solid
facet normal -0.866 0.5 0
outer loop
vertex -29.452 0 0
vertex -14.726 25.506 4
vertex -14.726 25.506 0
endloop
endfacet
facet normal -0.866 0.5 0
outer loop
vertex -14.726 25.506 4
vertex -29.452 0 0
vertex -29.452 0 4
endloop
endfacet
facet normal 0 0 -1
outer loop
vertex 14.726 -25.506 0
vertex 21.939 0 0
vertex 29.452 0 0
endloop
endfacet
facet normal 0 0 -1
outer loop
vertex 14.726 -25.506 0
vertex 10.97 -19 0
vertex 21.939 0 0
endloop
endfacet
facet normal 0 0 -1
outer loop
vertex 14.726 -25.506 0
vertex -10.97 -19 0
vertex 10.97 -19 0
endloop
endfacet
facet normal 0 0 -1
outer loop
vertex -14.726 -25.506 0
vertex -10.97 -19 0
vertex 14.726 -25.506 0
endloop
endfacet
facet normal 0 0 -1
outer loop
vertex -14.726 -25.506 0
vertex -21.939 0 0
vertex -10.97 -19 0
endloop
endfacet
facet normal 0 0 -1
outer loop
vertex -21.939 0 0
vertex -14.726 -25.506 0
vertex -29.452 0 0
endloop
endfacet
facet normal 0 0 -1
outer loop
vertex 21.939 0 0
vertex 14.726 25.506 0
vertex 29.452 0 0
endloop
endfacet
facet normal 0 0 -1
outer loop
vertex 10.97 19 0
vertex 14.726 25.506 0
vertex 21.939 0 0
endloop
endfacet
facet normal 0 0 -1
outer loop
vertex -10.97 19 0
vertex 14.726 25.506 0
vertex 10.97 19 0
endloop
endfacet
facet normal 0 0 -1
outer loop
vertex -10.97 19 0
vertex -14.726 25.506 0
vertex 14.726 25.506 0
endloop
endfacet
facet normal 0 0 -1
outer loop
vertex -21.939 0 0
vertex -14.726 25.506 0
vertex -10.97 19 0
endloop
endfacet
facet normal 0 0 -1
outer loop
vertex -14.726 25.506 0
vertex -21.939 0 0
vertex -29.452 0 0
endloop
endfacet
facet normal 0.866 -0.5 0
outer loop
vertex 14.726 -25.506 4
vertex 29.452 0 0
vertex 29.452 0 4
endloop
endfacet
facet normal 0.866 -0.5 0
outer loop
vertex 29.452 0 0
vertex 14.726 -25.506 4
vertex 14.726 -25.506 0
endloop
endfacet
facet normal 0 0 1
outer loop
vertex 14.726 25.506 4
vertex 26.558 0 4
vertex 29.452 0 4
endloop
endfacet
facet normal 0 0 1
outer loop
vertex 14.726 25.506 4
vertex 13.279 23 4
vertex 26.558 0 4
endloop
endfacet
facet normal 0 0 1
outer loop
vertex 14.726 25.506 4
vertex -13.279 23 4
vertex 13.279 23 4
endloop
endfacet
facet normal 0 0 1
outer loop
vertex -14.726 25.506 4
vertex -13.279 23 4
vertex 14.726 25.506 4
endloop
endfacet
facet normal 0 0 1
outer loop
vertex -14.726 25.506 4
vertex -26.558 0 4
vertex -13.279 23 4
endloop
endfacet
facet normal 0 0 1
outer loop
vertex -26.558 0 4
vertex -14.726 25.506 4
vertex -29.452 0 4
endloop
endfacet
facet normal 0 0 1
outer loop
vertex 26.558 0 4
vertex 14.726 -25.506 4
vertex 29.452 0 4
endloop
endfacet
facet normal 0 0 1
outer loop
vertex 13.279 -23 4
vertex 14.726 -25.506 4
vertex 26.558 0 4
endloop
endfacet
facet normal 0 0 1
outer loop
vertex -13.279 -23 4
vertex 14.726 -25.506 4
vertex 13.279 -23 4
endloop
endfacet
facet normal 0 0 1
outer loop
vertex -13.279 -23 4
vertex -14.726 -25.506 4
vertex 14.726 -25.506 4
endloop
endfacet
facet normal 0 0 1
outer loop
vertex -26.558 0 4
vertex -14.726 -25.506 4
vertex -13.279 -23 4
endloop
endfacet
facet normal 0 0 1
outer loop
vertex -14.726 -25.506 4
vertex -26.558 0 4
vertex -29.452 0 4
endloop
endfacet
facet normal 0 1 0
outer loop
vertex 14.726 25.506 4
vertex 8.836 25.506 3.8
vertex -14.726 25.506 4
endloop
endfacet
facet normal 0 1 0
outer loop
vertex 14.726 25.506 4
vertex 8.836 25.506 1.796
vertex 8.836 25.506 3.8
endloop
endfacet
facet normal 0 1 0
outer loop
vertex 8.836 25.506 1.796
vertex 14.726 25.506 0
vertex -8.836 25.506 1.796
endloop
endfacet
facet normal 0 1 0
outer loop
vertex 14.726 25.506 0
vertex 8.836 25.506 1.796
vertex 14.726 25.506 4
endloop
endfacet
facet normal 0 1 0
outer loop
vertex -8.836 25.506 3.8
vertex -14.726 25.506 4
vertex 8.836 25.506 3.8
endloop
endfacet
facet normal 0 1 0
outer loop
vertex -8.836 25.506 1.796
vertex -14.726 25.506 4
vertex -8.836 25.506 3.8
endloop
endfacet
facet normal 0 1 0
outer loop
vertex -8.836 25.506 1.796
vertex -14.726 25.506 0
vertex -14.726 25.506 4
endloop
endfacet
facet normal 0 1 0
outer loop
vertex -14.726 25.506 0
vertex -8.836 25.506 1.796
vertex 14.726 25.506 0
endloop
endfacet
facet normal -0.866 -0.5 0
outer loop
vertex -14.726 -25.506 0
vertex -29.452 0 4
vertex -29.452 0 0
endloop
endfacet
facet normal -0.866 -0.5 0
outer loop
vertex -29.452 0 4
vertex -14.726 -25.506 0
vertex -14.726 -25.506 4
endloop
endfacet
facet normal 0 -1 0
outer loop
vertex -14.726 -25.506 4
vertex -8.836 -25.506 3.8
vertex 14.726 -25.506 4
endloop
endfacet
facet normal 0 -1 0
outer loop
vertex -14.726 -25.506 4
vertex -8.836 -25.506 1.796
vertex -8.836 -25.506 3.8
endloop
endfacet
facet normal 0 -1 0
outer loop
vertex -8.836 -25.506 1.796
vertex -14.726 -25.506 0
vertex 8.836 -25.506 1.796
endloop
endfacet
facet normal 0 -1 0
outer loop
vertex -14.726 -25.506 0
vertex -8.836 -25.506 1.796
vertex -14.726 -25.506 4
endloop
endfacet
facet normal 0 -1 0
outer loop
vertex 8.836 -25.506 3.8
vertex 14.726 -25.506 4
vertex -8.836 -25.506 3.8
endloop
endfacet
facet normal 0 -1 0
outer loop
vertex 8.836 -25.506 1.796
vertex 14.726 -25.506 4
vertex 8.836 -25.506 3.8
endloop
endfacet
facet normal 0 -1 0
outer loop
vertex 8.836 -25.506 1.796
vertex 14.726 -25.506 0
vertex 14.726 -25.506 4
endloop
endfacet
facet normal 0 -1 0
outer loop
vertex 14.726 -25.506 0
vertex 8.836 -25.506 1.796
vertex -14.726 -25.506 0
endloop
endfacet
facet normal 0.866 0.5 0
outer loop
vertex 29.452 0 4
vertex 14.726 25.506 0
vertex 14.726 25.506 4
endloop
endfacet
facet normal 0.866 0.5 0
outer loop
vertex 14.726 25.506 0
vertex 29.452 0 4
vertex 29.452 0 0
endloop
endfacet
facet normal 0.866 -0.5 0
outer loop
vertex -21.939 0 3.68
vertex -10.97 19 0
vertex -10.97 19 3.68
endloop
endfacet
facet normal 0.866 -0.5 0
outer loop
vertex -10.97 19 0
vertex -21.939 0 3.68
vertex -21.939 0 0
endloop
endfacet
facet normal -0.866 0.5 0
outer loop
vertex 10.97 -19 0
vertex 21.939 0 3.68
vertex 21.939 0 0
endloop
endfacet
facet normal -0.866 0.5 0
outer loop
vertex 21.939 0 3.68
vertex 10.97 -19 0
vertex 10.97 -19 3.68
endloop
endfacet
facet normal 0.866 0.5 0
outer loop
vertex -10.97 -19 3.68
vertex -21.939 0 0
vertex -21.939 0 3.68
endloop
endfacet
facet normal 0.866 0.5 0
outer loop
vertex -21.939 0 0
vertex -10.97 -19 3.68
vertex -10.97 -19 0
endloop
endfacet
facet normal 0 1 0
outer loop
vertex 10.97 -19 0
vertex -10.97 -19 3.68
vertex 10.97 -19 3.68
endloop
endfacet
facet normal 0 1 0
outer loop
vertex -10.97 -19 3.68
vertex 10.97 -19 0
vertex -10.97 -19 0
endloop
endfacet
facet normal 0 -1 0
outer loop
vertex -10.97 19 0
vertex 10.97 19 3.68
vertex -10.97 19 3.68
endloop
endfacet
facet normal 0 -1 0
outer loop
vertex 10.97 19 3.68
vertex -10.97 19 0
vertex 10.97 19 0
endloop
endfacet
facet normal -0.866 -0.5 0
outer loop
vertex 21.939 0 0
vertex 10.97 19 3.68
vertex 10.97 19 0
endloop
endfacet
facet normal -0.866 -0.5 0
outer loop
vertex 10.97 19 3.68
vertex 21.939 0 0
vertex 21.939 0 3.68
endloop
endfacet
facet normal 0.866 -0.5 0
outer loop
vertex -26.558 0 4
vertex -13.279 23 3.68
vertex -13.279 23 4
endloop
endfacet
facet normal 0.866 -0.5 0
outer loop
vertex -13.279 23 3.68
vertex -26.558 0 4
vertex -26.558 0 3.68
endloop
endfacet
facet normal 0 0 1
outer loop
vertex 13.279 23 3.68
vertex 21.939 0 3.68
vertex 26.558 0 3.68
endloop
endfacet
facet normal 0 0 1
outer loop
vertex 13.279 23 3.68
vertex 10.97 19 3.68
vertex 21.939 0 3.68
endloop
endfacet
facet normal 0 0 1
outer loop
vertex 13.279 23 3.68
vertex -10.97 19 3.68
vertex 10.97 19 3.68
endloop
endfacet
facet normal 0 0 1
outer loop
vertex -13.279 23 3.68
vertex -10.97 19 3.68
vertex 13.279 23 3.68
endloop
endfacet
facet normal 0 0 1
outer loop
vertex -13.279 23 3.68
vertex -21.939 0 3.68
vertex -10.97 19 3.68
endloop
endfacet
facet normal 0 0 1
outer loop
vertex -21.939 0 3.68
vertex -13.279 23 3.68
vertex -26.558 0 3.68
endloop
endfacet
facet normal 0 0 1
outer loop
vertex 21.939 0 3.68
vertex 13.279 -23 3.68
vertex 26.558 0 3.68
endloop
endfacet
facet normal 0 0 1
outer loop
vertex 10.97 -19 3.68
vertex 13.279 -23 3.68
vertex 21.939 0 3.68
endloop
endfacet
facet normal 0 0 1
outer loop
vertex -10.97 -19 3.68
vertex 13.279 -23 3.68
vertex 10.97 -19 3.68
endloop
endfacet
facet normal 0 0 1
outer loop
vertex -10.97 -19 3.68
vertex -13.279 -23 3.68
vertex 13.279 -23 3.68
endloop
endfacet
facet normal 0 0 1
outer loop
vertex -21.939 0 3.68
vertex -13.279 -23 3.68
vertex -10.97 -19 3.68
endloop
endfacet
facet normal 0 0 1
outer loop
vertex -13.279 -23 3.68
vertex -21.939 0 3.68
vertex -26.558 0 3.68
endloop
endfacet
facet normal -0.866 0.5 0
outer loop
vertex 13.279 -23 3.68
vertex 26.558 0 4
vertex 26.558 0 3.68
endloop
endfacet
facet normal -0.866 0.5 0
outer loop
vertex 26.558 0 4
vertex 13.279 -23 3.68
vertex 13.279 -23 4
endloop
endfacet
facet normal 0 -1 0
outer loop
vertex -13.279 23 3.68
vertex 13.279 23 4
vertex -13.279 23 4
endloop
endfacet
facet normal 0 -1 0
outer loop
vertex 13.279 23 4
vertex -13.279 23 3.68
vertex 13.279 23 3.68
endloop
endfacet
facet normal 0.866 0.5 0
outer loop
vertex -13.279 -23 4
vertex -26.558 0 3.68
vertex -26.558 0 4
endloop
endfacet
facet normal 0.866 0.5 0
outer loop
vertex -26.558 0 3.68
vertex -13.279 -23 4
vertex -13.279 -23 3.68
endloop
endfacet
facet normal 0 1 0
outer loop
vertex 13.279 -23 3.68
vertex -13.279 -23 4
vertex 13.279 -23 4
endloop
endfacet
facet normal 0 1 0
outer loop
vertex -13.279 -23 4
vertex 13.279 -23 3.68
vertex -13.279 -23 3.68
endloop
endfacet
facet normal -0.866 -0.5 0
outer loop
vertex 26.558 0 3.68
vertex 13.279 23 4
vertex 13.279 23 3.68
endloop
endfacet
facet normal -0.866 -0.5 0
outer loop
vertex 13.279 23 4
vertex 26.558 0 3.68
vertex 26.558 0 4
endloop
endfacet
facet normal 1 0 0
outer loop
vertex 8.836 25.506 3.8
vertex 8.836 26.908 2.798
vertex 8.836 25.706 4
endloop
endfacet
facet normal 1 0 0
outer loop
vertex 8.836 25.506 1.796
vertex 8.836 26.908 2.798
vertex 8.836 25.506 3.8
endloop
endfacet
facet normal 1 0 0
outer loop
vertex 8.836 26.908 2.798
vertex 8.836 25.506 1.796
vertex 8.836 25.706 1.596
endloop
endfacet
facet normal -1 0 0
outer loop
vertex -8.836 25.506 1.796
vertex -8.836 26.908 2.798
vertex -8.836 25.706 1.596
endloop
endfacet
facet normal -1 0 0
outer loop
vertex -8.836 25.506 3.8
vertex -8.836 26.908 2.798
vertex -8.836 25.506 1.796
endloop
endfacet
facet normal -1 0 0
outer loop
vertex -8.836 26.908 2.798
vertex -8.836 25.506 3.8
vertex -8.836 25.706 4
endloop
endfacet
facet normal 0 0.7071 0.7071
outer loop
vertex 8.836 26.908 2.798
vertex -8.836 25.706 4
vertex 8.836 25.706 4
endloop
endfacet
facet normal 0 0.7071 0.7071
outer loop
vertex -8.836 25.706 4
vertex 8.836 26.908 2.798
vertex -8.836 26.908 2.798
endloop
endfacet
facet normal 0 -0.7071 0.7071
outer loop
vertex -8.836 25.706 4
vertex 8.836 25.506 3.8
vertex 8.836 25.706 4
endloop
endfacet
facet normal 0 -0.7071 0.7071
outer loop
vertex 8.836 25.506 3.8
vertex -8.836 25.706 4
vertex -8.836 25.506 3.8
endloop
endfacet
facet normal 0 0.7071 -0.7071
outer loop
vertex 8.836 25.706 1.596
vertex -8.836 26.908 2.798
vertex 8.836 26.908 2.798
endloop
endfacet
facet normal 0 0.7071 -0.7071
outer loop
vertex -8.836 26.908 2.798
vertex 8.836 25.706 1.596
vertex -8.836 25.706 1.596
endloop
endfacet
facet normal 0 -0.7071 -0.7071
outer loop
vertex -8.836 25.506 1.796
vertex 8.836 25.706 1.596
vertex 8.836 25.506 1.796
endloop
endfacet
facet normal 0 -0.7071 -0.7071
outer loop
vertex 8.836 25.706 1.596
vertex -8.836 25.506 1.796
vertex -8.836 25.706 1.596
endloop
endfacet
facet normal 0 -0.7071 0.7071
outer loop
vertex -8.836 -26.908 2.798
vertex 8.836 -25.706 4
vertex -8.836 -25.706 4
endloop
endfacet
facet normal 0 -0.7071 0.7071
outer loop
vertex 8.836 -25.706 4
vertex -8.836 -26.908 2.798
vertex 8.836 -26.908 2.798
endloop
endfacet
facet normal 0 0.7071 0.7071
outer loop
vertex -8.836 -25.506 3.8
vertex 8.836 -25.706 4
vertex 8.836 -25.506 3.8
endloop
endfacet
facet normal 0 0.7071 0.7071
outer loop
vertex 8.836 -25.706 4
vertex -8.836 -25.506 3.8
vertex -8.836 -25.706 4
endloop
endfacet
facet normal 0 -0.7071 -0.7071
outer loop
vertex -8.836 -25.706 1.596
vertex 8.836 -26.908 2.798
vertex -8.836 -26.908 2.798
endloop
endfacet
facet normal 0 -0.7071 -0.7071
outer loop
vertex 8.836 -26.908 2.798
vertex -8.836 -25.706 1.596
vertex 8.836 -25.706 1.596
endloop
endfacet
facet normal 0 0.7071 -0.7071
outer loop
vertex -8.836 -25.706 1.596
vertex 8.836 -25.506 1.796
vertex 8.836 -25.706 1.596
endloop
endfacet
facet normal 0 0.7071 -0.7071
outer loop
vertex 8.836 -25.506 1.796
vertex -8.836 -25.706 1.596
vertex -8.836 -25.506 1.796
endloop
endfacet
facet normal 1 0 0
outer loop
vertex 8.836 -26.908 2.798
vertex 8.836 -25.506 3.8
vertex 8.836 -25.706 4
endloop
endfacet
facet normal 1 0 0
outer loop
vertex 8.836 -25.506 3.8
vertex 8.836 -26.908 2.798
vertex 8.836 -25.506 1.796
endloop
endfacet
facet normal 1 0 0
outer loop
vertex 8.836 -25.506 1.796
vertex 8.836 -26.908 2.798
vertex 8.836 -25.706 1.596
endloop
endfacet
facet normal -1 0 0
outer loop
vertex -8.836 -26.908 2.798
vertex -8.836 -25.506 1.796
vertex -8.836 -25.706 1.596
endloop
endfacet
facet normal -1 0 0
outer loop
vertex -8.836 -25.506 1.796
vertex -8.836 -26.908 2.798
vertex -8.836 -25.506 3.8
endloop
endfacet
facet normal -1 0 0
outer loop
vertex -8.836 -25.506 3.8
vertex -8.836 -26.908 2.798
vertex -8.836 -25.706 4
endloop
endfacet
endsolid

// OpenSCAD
// file: ../lib/clips.scad
// ============================================================================
// CLIPS — hexrack's 45-degree rib into a groove
// ============================================================================
// hexrack's dust-filter clip, used for every clipped joint here: modules to each
// other, the lid to the top module, the filter to the front face.
//
// A joint is [name, centre, axis, length]:
//   centre - the rib's axis ON THE JOINT PLANE (the mating part's face), in the frame
//            of the part that carries the rib
//   axis   - "x", "y" or "z": the direction the rib runs
//
// ONE POSITION PER JOINT. The part with the rib and the part with the groove both read
// the same row; hexrack once had a groove anchored to a different datum than its rib,
// 9mm away, and both parts still exported clean. scripts/test-clips.sh checks every row.
//
// The rib is a square section turned 45 degrees and centred on the joint plane, so
// half of it stands proud into the mate's groove. The groove is the same diamond grown
// by clip_clear, so at rest the rib touches nothing.
// ============================================================================

include <../config.scad>

module clipDiamond(axis, len, side) {
  if (axis == "x")      rotate([45, 0, 0]) cube([len, side, side], center = true);
  else if (axis == "y") rotate([0, 45, 0]) cube([side, len, side], center = true);
  else                  rotate([0, 0, 45]) cube([side, side, len], center = true);
}

module clipRib(j) {
  translate(j[1]) clipDiamond(j[2], j[3], clip_rib);
}

// clip_rib*sqrt(2)/2 is the half-diagonal, so growing it by clip_clear means growing
// the side by clip_clear*sqrt(2).
module clipGroove(j) {
  translate(j[1]) clipDiamond(j[2], j[3] + 2 * clip_clear, clip_rib + sqrt(2) * clip_clear);
}
// file: ../lib/dust-filter.scad
// ============================================================================
// DUST FILTER — the hexagon and its clip joints, shared by the module and the filter
// ============================================================================
// hexrack's dust filter, one per module: a hexagonal ring flush in a recess in the
// front wall, fabric glued on its back, two 45-degree ribs on its top and bottom flats
// at the ring's back. The module cuts the recess and the grooves from here; the filter
// part builds the ring and the ribs from here; test-clips.sh checks every joint here.
//
// Module frame. The front wall's 2D frame is centred on the fan: profile x -> Y,
// profile y -> Z, extrusion -> +X into the wall.
// ============================================================================

include <../config.scad>
include <clips.scad>

// A hexagon of apothem a, flats top and bottom: circle($fn=6) puts a vertex on +x.
module hexProfile(a) {
  circle(r = a / cos(30), $fn = 6);
}

module onFrontWall(x0) {
  translate([x0, fan_yc, fan_zc]) rotate([90, 0, 90]) children();
}

// Ribs on the top and bottom flats, centred on the recess's face, their back vertex
// on the ring's back face -- where hexrack puts them (dust_clip_y).
function filterJoints() =
  let (x = filter_depth - rib_half)
  [ ["filter-top",    [x, fan_yc, fan_zc + filter_a_recess], "y", filter_rib_len],
    ["filter-bottom", [x, fan_yc, fan_zc - filter_a_recess], "y", filter_rib_len] ];

// The recess the ring sits in, from the front face.
module filterRecess() {
  onFrontWall(-EPS) linear_extrude(filter_depth + EPS) hexProfile(filter_a_recess);
}

module filterGrooves() { for (j = filterJoints()) clipGroove(j); }
// main file
// ============================================================================
// DUST FILTER — hexrack's, one per module
// ============================================================================
// A hexagonal ring that sits FLUSH in the recess in a module's front wall, over its
// fan. Filter fabric is glued into a 0.32mm pocket on its BACK, reaching 4mm out from
// the window, and spans the window; the ring only frames it. Two 45-degree ribs on its
// top and bottom flats, at its back, click into grooves in the recess -- hexrack's
// sectionDust(), sized for a 40mm fan. The ring also covers the fan's four screw heads.
//
// ONE DEFINITION OF THE FITTED PART. The ribs come from filterJoints() in the MODULE
// frame -- the same rows that cut the grooves -- so filterMounted() is the ring placed
// in the recess plus those ribs, and the printable part is that brought back by the
// exact inverse of the placement. No second copy of the rib position to drift.
//
// Printed front face down: the fabric pocket faces up, the ribs stand on its edges.
// Print one per module.
// ============================================================================

include <../lib/dust-filter.scad>

// The ring in its own frame: front face at z = 0, thickness up, fabric pocket on top.
module filterRingLocal() {
  difference() {
    linear_extrude(filter_depth) hexProfile(filter_a_out);
    translate([0, 0, -EPS]) linear_extrude(filter_depth + 2 * EPS) hexProfile(filter_a_in);
    translate([0, 0, filter_depth - filter_glue_d])
      linear_extrude(filter_glue_d + EPS) hexProfile(filter_a_in + filter_glue_band);
  }
}

// Ring frame -> module frame. Rz(90) then Ry(90): local x -> Y, local y -> Z, local
// z -> +X. The ring's front face lands on the module's front face.
function filterOrigin() = [0, fan_yc, fan_zc];

module filterPlace() {
  translate(filterOrigin()) rotate([0, 90, 0]) rotate([0, 0, 90]) children();
}

module filterMounted(pull = 0) {
  translate([-pull, 0, 0])
    union() {
      filterPlace() filterRingLocal();
      for (j = filterJoints()) clipRib(j);
    }
}

// The exact inverse of filterPlace(): translate back, Ry(-90), Rz(-90).
module filterPart() {
  rotate([0, 0, -90]) rotate([0, -90, 0])
    translate(-filterOrigin())
      filterMounted();
}

filterPart();
